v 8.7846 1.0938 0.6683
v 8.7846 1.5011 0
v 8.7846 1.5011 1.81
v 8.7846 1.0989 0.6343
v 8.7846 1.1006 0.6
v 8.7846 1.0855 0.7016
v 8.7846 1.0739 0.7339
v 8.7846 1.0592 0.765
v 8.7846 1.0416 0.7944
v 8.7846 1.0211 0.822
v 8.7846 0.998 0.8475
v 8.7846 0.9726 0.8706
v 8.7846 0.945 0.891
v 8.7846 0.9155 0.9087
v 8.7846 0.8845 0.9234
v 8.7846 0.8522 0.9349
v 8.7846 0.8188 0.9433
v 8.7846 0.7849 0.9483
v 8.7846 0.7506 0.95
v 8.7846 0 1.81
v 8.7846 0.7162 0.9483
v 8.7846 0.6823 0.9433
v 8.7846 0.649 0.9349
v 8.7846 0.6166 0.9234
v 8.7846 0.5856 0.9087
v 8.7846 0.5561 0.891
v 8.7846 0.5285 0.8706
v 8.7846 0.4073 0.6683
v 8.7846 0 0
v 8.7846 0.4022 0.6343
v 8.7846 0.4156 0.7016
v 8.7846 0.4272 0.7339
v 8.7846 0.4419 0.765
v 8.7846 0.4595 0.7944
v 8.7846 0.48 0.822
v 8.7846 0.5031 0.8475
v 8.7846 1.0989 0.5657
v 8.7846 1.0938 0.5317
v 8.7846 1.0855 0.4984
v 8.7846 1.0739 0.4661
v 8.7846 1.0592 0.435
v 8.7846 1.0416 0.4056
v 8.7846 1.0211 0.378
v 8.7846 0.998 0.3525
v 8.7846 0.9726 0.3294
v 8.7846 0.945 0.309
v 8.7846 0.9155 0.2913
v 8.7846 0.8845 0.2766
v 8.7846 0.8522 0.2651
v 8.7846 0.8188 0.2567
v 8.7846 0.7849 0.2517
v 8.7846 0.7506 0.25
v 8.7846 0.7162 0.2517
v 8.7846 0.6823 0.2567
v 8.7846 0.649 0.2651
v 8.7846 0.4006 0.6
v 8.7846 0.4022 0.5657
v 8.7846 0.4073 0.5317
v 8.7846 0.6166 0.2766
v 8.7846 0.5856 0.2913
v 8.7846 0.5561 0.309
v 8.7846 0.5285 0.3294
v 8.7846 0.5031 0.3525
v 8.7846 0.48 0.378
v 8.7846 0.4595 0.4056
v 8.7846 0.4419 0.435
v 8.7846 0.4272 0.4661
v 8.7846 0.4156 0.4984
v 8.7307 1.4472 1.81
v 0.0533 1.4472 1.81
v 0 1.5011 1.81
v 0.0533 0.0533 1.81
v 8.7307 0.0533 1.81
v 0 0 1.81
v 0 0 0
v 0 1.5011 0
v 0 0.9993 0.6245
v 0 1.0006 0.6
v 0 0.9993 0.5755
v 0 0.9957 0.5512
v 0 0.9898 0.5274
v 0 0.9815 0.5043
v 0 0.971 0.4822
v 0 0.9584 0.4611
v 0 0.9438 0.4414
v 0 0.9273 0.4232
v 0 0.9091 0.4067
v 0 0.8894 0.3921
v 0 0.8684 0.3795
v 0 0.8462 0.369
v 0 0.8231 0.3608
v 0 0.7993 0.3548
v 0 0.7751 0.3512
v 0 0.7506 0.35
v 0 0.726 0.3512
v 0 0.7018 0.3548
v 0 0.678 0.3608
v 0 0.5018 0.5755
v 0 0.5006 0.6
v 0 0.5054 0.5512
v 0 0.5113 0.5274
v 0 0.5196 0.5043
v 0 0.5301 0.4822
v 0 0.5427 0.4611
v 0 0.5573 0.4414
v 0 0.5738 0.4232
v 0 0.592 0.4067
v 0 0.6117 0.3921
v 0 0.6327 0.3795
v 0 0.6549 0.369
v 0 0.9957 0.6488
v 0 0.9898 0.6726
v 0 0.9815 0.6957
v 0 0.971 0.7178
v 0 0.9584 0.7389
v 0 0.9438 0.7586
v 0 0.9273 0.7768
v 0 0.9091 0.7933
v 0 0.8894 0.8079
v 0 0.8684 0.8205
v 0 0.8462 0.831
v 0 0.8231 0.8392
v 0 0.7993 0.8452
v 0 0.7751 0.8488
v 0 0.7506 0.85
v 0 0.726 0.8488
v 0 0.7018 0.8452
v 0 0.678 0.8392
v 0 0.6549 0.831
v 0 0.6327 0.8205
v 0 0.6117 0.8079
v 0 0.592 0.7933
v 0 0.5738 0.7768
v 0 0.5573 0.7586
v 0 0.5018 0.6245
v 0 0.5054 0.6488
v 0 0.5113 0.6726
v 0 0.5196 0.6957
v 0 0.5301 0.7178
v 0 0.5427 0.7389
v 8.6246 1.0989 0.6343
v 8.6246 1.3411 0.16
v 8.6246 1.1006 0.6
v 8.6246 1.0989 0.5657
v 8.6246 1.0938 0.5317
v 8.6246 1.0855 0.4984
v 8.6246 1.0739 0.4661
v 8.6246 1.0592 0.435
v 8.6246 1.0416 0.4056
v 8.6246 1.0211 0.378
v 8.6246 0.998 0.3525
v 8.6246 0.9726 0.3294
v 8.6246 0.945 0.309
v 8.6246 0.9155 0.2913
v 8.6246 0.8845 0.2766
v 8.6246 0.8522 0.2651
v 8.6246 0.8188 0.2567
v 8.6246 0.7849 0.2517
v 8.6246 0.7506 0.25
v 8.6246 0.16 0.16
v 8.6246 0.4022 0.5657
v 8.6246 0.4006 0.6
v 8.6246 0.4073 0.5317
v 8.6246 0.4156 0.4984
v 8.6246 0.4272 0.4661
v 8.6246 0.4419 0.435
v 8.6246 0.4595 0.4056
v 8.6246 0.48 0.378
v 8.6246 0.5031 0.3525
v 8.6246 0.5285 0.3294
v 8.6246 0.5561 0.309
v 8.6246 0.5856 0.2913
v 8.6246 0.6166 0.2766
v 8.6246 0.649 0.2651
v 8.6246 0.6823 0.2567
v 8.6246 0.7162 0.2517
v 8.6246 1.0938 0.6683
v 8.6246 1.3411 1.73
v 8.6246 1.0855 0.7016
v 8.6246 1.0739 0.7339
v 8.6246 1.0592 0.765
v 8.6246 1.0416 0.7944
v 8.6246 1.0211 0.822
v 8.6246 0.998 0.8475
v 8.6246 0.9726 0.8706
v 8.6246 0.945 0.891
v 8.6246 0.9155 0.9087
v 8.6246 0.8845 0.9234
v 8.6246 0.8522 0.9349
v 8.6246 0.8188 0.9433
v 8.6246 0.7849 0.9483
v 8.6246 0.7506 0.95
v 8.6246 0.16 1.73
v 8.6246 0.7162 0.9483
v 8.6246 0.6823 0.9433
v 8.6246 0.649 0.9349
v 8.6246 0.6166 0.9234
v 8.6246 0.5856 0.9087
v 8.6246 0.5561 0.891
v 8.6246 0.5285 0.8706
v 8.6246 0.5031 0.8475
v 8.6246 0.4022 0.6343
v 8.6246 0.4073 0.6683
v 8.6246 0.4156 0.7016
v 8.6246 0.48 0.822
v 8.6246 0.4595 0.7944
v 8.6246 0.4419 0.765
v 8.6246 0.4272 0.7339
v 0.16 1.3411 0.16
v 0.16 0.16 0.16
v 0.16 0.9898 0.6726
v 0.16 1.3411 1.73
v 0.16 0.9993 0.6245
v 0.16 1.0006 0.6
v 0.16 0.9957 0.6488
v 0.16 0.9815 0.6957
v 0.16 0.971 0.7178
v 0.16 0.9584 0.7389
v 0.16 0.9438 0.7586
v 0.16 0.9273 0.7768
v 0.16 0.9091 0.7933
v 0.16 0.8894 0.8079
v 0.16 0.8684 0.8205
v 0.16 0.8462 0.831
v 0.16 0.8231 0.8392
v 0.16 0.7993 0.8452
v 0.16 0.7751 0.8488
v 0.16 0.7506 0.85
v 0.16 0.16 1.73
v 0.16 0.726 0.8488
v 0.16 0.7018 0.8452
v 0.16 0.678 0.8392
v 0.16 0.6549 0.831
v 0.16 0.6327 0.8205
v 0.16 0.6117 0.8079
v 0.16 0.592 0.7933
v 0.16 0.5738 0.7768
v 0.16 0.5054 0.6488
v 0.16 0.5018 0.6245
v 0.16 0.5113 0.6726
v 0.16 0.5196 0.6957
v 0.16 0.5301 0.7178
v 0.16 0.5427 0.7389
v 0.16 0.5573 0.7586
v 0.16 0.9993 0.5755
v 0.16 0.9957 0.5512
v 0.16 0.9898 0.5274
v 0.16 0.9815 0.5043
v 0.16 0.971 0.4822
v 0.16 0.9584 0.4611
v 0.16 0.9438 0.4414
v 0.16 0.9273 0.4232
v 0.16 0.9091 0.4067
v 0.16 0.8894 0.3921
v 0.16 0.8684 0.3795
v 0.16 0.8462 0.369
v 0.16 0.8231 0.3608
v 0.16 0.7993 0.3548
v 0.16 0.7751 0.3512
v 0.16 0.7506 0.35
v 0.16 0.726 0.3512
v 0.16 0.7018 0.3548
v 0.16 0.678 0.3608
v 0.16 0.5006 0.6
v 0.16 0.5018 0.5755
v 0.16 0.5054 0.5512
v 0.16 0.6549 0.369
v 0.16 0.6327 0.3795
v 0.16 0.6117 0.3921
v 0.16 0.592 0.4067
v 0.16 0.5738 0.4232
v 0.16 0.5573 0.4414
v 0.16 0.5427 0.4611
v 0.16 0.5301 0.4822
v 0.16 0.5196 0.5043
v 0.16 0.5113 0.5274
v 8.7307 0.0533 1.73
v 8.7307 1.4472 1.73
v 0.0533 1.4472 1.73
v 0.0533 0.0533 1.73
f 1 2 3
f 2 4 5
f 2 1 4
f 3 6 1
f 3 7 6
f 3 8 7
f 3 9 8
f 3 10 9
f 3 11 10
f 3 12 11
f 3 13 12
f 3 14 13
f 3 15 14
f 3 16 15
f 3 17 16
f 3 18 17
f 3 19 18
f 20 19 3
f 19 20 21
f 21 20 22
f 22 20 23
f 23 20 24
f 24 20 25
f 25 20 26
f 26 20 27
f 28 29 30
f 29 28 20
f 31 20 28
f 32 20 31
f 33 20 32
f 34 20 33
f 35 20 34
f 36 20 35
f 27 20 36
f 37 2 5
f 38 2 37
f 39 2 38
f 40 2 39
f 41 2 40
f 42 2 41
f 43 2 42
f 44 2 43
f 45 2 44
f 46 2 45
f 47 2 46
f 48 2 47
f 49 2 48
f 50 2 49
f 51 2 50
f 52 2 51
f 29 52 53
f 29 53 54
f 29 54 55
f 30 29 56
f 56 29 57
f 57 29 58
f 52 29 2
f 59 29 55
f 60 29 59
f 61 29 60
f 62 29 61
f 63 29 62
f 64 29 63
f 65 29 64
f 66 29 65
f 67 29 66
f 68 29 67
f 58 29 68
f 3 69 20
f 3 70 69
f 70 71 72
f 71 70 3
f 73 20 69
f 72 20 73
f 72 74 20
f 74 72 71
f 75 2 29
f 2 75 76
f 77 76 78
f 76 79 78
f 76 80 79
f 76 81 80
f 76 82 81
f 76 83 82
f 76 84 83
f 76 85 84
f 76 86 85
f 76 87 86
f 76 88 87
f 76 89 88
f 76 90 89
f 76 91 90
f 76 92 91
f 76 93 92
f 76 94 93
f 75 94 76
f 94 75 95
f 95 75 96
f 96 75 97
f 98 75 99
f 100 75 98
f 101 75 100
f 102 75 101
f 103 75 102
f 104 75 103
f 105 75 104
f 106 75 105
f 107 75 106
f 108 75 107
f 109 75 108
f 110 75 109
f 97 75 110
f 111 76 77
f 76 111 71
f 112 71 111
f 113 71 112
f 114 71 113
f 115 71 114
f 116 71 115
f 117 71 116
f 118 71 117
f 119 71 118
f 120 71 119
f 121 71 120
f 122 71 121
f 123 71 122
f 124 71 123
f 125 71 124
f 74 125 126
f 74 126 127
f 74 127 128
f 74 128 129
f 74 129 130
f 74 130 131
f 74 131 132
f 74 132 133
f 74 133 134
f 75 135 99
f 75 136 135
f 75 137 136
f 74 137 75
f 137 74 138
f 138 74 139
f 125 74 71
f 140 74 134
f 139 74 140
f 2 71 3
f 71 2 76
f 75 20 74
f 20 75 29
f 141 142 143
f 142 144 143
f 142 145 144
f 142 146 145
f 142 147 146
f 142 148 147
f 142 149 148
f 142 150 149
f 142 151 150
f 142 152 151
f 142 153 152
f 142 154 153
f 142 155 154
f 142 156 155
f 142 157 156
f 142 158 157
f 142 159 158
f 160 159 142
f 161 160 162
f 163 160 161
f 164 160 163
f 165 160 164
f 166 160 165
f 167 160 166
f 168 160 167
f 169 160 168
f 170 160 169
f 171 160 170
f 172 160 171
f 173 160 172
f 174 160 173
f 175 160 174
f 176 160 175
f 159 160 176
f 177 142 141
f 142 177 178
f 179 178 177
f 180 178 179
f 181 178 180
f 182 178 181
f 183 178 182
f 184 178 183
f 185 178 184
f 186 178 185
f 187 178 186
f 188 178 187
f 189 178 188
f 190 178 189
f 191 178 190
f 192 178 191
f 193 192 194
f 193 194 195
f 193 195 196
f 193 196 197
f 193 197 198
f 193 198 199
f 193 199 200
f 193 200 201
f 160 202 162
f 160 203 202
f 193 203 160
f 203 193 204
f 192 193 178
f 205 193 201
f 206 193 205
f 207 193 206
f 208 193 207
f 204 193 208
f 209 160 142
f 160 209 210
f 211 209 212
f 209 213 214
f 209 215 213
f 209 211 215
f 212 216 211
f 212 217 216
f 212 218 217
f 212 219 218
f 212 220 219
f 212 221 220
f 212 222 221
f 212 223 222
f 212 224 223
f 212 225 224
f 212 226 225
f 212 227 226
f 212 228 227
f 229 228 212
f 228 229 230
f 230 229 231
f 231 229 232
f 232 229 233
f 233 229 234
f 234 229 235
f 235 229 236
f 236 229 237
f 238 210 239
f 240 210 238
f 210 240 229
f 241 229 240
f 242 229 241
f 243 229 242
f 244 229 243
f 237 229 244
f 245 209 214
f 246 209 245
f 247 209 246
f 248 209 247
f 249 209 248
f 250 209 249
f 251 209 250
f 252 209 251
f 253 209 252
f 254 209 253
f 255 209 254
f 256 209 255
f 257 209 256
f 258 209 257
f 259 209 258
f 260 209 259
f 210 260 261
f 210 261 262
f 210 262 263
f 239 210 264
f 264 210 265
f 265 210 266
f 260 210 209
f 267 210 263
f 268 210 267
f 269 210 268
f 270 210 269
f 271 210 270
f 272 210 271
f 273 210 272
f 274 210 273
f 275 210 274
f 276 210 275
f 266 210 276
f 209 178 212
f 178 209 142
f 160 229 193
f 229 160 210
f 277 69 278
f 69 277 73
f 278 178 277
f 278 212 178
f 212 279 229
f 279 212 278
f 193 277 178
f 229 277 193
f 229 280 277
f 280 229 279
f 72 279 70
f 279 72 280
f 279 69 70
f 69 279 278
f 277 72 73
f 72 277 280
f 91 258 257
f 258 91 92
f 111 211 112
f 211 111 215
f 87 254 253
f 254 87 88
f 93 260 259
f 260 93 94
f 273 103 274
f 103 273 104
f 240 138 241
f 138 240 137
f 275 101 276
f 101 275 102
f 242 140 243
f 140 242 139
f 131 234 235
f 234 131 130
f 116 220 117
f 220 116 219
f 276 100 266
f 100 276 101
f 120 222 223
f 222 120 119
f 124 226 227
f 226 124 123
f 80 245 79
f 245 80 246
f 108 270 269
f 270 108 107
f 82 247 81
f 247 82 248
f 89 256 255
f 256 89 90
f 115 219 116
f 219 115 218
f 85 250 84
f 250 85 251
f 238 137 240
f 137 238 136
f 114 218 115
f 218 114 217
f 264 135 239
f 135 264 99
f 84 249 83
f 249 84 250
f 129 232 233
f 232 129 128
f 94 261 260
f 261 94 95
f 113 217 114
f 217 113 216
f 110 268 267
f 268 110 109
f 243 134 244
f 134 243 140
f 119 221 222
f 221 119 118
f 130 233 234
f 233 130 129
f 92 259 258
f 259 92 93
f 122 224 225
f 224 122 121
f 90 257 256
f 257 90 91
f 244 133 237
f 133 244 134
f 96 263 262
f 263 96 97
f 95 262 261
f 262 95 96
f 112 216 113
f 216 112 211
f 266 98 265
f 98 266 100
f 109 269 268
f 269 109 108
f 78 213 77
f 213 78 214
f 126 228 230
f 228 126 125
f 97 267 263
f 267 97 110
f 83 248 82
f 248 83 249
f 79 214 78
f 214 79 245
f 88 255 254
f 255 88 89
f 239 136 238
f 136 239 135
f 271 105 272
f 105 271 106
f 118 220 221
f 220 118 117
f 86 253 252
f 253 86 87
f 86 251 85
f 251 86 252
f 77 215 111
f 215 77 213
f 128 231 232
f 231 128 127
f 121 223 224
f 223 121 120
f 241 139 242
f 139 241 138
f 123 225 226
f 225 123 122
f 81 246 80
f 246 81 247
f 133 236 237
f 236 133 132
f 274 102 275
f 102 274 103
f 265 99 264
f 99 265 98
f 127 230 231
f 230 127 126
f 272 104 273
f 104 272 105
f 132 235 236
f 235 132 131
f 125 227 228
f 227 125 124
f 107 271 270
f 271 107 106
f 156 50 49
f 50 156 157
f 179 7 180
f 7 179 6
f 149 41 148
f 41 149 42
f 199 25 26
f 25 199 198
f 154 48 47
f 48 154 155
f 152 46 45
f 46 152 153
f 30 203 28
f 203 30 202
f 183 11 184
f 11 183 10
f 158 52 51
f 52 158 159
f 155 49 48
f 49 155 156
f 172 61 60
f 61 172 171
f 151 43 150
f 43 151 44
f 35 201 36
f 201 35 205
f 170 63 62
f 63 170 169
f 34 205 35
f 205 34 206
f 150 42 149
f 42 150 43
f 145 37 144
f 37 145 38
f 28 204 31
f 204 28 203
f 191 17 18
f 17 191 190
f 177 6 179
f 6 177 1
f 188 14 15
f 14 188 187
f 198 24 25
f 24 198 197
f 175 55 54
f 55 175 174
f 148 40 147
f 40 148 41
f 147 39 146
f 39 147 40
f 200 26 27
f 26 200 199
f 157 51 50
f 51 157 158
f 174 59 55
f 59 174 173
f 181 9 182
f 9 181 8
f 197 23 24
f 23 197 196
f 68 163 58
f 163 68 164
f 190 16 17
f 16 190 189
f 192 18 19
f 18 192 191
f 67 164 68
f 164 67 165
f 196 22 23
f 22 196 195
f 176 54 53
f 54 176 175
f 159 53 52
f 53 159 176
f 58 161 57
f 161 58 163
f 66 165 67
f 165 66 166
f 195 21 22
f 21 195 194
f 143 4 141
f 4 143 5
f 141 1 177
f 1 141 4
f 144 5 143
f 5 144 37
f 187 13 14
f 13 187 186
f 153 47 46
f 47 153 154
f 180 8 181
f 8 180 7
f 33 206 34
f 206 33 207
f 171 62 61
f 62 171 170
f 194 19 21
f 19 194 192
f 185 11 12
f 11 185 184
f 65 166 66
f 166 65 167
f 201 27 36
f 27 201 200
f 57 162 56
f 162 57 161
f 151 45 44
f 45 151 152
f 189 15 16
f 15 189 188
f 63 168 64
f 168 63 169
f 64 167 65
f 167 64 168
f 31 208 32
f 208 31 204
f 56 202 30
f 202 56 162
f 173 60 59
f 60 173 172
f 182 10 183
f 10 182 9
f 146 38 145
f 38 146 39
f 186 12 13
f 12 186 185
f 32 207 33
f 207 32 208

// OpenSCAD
// Industrial 12-Node Infrastructure - Advanced Submersion Shield Junction Box
$fn = 64;

// Scaled structural boundary footprint for ultra-harsh environments
pcb_length     = 215.0 * 0.0393701; // Inches (~8.46")
pcb_width      = 30.0  * 0.0393701;  // Inches (~1.18")
internal_depth = 1.65;               // Deeper basin for massive structural compound potting
wall_thick     = 0.16;               // Heavy-duty 4mm flame-retardant walls

module high_exposure_junction_shield() {
    difference() {
        // 1. Primary Structural Chassis Basin (Molded in Standard Fire Red polymer)
        cube([pcb_length + (wall_thick * 2), pcb_width + (wall_thick * 2), internal_depth + wall_thick]);
        
        // 2. Primary Internal Core Electronics Sanctuary Cavity
        translate([wall_thick, wall_thick, wall_thick])
            cube([pcb_length, pcb_width, internal_depth + 0.1]);
            
        // 3. Multi-Tiered Outer Labyrinth Gasket Groove (Twin Tracks)
        // Deflects high-pressure fluid vectors away from internal layout components
        translate([wall_thick / 3, wall_thick / 3, internal_depth + wall_thick - 0.08])
            cube([pcb_length + (wall_thick * 1.33), pcb_width + (wall_thick * 1.33), 0.10]);
            
        // 4. Threaded IP68 Heavy-Duty 2.1mm DC Power Bulkhead Opening
        translate([-0.05, (pcb_width / 2) + wall_thick, 0.6])
            rotate([0, 90, 0])
                cylinder(h = wall_thick + 0.1, d = 0.50); // Sized for double-gasket brass coupling collars
                
        // 5. Threaded IP68 Heavy-Duty Host Data Link USB-B Bulkhead Opening
        translate([pcb_length + wall_thick - 0.05, (pcb_width / 2) + wall_thick, 0.6])
            rotate([0, 90, 0])
                cylinder(h = wall_thick + 0.1, d = 0.70); // Deep threaded industrial bulkhead lock rings
    }
}

high_exposure_junction_shield();
